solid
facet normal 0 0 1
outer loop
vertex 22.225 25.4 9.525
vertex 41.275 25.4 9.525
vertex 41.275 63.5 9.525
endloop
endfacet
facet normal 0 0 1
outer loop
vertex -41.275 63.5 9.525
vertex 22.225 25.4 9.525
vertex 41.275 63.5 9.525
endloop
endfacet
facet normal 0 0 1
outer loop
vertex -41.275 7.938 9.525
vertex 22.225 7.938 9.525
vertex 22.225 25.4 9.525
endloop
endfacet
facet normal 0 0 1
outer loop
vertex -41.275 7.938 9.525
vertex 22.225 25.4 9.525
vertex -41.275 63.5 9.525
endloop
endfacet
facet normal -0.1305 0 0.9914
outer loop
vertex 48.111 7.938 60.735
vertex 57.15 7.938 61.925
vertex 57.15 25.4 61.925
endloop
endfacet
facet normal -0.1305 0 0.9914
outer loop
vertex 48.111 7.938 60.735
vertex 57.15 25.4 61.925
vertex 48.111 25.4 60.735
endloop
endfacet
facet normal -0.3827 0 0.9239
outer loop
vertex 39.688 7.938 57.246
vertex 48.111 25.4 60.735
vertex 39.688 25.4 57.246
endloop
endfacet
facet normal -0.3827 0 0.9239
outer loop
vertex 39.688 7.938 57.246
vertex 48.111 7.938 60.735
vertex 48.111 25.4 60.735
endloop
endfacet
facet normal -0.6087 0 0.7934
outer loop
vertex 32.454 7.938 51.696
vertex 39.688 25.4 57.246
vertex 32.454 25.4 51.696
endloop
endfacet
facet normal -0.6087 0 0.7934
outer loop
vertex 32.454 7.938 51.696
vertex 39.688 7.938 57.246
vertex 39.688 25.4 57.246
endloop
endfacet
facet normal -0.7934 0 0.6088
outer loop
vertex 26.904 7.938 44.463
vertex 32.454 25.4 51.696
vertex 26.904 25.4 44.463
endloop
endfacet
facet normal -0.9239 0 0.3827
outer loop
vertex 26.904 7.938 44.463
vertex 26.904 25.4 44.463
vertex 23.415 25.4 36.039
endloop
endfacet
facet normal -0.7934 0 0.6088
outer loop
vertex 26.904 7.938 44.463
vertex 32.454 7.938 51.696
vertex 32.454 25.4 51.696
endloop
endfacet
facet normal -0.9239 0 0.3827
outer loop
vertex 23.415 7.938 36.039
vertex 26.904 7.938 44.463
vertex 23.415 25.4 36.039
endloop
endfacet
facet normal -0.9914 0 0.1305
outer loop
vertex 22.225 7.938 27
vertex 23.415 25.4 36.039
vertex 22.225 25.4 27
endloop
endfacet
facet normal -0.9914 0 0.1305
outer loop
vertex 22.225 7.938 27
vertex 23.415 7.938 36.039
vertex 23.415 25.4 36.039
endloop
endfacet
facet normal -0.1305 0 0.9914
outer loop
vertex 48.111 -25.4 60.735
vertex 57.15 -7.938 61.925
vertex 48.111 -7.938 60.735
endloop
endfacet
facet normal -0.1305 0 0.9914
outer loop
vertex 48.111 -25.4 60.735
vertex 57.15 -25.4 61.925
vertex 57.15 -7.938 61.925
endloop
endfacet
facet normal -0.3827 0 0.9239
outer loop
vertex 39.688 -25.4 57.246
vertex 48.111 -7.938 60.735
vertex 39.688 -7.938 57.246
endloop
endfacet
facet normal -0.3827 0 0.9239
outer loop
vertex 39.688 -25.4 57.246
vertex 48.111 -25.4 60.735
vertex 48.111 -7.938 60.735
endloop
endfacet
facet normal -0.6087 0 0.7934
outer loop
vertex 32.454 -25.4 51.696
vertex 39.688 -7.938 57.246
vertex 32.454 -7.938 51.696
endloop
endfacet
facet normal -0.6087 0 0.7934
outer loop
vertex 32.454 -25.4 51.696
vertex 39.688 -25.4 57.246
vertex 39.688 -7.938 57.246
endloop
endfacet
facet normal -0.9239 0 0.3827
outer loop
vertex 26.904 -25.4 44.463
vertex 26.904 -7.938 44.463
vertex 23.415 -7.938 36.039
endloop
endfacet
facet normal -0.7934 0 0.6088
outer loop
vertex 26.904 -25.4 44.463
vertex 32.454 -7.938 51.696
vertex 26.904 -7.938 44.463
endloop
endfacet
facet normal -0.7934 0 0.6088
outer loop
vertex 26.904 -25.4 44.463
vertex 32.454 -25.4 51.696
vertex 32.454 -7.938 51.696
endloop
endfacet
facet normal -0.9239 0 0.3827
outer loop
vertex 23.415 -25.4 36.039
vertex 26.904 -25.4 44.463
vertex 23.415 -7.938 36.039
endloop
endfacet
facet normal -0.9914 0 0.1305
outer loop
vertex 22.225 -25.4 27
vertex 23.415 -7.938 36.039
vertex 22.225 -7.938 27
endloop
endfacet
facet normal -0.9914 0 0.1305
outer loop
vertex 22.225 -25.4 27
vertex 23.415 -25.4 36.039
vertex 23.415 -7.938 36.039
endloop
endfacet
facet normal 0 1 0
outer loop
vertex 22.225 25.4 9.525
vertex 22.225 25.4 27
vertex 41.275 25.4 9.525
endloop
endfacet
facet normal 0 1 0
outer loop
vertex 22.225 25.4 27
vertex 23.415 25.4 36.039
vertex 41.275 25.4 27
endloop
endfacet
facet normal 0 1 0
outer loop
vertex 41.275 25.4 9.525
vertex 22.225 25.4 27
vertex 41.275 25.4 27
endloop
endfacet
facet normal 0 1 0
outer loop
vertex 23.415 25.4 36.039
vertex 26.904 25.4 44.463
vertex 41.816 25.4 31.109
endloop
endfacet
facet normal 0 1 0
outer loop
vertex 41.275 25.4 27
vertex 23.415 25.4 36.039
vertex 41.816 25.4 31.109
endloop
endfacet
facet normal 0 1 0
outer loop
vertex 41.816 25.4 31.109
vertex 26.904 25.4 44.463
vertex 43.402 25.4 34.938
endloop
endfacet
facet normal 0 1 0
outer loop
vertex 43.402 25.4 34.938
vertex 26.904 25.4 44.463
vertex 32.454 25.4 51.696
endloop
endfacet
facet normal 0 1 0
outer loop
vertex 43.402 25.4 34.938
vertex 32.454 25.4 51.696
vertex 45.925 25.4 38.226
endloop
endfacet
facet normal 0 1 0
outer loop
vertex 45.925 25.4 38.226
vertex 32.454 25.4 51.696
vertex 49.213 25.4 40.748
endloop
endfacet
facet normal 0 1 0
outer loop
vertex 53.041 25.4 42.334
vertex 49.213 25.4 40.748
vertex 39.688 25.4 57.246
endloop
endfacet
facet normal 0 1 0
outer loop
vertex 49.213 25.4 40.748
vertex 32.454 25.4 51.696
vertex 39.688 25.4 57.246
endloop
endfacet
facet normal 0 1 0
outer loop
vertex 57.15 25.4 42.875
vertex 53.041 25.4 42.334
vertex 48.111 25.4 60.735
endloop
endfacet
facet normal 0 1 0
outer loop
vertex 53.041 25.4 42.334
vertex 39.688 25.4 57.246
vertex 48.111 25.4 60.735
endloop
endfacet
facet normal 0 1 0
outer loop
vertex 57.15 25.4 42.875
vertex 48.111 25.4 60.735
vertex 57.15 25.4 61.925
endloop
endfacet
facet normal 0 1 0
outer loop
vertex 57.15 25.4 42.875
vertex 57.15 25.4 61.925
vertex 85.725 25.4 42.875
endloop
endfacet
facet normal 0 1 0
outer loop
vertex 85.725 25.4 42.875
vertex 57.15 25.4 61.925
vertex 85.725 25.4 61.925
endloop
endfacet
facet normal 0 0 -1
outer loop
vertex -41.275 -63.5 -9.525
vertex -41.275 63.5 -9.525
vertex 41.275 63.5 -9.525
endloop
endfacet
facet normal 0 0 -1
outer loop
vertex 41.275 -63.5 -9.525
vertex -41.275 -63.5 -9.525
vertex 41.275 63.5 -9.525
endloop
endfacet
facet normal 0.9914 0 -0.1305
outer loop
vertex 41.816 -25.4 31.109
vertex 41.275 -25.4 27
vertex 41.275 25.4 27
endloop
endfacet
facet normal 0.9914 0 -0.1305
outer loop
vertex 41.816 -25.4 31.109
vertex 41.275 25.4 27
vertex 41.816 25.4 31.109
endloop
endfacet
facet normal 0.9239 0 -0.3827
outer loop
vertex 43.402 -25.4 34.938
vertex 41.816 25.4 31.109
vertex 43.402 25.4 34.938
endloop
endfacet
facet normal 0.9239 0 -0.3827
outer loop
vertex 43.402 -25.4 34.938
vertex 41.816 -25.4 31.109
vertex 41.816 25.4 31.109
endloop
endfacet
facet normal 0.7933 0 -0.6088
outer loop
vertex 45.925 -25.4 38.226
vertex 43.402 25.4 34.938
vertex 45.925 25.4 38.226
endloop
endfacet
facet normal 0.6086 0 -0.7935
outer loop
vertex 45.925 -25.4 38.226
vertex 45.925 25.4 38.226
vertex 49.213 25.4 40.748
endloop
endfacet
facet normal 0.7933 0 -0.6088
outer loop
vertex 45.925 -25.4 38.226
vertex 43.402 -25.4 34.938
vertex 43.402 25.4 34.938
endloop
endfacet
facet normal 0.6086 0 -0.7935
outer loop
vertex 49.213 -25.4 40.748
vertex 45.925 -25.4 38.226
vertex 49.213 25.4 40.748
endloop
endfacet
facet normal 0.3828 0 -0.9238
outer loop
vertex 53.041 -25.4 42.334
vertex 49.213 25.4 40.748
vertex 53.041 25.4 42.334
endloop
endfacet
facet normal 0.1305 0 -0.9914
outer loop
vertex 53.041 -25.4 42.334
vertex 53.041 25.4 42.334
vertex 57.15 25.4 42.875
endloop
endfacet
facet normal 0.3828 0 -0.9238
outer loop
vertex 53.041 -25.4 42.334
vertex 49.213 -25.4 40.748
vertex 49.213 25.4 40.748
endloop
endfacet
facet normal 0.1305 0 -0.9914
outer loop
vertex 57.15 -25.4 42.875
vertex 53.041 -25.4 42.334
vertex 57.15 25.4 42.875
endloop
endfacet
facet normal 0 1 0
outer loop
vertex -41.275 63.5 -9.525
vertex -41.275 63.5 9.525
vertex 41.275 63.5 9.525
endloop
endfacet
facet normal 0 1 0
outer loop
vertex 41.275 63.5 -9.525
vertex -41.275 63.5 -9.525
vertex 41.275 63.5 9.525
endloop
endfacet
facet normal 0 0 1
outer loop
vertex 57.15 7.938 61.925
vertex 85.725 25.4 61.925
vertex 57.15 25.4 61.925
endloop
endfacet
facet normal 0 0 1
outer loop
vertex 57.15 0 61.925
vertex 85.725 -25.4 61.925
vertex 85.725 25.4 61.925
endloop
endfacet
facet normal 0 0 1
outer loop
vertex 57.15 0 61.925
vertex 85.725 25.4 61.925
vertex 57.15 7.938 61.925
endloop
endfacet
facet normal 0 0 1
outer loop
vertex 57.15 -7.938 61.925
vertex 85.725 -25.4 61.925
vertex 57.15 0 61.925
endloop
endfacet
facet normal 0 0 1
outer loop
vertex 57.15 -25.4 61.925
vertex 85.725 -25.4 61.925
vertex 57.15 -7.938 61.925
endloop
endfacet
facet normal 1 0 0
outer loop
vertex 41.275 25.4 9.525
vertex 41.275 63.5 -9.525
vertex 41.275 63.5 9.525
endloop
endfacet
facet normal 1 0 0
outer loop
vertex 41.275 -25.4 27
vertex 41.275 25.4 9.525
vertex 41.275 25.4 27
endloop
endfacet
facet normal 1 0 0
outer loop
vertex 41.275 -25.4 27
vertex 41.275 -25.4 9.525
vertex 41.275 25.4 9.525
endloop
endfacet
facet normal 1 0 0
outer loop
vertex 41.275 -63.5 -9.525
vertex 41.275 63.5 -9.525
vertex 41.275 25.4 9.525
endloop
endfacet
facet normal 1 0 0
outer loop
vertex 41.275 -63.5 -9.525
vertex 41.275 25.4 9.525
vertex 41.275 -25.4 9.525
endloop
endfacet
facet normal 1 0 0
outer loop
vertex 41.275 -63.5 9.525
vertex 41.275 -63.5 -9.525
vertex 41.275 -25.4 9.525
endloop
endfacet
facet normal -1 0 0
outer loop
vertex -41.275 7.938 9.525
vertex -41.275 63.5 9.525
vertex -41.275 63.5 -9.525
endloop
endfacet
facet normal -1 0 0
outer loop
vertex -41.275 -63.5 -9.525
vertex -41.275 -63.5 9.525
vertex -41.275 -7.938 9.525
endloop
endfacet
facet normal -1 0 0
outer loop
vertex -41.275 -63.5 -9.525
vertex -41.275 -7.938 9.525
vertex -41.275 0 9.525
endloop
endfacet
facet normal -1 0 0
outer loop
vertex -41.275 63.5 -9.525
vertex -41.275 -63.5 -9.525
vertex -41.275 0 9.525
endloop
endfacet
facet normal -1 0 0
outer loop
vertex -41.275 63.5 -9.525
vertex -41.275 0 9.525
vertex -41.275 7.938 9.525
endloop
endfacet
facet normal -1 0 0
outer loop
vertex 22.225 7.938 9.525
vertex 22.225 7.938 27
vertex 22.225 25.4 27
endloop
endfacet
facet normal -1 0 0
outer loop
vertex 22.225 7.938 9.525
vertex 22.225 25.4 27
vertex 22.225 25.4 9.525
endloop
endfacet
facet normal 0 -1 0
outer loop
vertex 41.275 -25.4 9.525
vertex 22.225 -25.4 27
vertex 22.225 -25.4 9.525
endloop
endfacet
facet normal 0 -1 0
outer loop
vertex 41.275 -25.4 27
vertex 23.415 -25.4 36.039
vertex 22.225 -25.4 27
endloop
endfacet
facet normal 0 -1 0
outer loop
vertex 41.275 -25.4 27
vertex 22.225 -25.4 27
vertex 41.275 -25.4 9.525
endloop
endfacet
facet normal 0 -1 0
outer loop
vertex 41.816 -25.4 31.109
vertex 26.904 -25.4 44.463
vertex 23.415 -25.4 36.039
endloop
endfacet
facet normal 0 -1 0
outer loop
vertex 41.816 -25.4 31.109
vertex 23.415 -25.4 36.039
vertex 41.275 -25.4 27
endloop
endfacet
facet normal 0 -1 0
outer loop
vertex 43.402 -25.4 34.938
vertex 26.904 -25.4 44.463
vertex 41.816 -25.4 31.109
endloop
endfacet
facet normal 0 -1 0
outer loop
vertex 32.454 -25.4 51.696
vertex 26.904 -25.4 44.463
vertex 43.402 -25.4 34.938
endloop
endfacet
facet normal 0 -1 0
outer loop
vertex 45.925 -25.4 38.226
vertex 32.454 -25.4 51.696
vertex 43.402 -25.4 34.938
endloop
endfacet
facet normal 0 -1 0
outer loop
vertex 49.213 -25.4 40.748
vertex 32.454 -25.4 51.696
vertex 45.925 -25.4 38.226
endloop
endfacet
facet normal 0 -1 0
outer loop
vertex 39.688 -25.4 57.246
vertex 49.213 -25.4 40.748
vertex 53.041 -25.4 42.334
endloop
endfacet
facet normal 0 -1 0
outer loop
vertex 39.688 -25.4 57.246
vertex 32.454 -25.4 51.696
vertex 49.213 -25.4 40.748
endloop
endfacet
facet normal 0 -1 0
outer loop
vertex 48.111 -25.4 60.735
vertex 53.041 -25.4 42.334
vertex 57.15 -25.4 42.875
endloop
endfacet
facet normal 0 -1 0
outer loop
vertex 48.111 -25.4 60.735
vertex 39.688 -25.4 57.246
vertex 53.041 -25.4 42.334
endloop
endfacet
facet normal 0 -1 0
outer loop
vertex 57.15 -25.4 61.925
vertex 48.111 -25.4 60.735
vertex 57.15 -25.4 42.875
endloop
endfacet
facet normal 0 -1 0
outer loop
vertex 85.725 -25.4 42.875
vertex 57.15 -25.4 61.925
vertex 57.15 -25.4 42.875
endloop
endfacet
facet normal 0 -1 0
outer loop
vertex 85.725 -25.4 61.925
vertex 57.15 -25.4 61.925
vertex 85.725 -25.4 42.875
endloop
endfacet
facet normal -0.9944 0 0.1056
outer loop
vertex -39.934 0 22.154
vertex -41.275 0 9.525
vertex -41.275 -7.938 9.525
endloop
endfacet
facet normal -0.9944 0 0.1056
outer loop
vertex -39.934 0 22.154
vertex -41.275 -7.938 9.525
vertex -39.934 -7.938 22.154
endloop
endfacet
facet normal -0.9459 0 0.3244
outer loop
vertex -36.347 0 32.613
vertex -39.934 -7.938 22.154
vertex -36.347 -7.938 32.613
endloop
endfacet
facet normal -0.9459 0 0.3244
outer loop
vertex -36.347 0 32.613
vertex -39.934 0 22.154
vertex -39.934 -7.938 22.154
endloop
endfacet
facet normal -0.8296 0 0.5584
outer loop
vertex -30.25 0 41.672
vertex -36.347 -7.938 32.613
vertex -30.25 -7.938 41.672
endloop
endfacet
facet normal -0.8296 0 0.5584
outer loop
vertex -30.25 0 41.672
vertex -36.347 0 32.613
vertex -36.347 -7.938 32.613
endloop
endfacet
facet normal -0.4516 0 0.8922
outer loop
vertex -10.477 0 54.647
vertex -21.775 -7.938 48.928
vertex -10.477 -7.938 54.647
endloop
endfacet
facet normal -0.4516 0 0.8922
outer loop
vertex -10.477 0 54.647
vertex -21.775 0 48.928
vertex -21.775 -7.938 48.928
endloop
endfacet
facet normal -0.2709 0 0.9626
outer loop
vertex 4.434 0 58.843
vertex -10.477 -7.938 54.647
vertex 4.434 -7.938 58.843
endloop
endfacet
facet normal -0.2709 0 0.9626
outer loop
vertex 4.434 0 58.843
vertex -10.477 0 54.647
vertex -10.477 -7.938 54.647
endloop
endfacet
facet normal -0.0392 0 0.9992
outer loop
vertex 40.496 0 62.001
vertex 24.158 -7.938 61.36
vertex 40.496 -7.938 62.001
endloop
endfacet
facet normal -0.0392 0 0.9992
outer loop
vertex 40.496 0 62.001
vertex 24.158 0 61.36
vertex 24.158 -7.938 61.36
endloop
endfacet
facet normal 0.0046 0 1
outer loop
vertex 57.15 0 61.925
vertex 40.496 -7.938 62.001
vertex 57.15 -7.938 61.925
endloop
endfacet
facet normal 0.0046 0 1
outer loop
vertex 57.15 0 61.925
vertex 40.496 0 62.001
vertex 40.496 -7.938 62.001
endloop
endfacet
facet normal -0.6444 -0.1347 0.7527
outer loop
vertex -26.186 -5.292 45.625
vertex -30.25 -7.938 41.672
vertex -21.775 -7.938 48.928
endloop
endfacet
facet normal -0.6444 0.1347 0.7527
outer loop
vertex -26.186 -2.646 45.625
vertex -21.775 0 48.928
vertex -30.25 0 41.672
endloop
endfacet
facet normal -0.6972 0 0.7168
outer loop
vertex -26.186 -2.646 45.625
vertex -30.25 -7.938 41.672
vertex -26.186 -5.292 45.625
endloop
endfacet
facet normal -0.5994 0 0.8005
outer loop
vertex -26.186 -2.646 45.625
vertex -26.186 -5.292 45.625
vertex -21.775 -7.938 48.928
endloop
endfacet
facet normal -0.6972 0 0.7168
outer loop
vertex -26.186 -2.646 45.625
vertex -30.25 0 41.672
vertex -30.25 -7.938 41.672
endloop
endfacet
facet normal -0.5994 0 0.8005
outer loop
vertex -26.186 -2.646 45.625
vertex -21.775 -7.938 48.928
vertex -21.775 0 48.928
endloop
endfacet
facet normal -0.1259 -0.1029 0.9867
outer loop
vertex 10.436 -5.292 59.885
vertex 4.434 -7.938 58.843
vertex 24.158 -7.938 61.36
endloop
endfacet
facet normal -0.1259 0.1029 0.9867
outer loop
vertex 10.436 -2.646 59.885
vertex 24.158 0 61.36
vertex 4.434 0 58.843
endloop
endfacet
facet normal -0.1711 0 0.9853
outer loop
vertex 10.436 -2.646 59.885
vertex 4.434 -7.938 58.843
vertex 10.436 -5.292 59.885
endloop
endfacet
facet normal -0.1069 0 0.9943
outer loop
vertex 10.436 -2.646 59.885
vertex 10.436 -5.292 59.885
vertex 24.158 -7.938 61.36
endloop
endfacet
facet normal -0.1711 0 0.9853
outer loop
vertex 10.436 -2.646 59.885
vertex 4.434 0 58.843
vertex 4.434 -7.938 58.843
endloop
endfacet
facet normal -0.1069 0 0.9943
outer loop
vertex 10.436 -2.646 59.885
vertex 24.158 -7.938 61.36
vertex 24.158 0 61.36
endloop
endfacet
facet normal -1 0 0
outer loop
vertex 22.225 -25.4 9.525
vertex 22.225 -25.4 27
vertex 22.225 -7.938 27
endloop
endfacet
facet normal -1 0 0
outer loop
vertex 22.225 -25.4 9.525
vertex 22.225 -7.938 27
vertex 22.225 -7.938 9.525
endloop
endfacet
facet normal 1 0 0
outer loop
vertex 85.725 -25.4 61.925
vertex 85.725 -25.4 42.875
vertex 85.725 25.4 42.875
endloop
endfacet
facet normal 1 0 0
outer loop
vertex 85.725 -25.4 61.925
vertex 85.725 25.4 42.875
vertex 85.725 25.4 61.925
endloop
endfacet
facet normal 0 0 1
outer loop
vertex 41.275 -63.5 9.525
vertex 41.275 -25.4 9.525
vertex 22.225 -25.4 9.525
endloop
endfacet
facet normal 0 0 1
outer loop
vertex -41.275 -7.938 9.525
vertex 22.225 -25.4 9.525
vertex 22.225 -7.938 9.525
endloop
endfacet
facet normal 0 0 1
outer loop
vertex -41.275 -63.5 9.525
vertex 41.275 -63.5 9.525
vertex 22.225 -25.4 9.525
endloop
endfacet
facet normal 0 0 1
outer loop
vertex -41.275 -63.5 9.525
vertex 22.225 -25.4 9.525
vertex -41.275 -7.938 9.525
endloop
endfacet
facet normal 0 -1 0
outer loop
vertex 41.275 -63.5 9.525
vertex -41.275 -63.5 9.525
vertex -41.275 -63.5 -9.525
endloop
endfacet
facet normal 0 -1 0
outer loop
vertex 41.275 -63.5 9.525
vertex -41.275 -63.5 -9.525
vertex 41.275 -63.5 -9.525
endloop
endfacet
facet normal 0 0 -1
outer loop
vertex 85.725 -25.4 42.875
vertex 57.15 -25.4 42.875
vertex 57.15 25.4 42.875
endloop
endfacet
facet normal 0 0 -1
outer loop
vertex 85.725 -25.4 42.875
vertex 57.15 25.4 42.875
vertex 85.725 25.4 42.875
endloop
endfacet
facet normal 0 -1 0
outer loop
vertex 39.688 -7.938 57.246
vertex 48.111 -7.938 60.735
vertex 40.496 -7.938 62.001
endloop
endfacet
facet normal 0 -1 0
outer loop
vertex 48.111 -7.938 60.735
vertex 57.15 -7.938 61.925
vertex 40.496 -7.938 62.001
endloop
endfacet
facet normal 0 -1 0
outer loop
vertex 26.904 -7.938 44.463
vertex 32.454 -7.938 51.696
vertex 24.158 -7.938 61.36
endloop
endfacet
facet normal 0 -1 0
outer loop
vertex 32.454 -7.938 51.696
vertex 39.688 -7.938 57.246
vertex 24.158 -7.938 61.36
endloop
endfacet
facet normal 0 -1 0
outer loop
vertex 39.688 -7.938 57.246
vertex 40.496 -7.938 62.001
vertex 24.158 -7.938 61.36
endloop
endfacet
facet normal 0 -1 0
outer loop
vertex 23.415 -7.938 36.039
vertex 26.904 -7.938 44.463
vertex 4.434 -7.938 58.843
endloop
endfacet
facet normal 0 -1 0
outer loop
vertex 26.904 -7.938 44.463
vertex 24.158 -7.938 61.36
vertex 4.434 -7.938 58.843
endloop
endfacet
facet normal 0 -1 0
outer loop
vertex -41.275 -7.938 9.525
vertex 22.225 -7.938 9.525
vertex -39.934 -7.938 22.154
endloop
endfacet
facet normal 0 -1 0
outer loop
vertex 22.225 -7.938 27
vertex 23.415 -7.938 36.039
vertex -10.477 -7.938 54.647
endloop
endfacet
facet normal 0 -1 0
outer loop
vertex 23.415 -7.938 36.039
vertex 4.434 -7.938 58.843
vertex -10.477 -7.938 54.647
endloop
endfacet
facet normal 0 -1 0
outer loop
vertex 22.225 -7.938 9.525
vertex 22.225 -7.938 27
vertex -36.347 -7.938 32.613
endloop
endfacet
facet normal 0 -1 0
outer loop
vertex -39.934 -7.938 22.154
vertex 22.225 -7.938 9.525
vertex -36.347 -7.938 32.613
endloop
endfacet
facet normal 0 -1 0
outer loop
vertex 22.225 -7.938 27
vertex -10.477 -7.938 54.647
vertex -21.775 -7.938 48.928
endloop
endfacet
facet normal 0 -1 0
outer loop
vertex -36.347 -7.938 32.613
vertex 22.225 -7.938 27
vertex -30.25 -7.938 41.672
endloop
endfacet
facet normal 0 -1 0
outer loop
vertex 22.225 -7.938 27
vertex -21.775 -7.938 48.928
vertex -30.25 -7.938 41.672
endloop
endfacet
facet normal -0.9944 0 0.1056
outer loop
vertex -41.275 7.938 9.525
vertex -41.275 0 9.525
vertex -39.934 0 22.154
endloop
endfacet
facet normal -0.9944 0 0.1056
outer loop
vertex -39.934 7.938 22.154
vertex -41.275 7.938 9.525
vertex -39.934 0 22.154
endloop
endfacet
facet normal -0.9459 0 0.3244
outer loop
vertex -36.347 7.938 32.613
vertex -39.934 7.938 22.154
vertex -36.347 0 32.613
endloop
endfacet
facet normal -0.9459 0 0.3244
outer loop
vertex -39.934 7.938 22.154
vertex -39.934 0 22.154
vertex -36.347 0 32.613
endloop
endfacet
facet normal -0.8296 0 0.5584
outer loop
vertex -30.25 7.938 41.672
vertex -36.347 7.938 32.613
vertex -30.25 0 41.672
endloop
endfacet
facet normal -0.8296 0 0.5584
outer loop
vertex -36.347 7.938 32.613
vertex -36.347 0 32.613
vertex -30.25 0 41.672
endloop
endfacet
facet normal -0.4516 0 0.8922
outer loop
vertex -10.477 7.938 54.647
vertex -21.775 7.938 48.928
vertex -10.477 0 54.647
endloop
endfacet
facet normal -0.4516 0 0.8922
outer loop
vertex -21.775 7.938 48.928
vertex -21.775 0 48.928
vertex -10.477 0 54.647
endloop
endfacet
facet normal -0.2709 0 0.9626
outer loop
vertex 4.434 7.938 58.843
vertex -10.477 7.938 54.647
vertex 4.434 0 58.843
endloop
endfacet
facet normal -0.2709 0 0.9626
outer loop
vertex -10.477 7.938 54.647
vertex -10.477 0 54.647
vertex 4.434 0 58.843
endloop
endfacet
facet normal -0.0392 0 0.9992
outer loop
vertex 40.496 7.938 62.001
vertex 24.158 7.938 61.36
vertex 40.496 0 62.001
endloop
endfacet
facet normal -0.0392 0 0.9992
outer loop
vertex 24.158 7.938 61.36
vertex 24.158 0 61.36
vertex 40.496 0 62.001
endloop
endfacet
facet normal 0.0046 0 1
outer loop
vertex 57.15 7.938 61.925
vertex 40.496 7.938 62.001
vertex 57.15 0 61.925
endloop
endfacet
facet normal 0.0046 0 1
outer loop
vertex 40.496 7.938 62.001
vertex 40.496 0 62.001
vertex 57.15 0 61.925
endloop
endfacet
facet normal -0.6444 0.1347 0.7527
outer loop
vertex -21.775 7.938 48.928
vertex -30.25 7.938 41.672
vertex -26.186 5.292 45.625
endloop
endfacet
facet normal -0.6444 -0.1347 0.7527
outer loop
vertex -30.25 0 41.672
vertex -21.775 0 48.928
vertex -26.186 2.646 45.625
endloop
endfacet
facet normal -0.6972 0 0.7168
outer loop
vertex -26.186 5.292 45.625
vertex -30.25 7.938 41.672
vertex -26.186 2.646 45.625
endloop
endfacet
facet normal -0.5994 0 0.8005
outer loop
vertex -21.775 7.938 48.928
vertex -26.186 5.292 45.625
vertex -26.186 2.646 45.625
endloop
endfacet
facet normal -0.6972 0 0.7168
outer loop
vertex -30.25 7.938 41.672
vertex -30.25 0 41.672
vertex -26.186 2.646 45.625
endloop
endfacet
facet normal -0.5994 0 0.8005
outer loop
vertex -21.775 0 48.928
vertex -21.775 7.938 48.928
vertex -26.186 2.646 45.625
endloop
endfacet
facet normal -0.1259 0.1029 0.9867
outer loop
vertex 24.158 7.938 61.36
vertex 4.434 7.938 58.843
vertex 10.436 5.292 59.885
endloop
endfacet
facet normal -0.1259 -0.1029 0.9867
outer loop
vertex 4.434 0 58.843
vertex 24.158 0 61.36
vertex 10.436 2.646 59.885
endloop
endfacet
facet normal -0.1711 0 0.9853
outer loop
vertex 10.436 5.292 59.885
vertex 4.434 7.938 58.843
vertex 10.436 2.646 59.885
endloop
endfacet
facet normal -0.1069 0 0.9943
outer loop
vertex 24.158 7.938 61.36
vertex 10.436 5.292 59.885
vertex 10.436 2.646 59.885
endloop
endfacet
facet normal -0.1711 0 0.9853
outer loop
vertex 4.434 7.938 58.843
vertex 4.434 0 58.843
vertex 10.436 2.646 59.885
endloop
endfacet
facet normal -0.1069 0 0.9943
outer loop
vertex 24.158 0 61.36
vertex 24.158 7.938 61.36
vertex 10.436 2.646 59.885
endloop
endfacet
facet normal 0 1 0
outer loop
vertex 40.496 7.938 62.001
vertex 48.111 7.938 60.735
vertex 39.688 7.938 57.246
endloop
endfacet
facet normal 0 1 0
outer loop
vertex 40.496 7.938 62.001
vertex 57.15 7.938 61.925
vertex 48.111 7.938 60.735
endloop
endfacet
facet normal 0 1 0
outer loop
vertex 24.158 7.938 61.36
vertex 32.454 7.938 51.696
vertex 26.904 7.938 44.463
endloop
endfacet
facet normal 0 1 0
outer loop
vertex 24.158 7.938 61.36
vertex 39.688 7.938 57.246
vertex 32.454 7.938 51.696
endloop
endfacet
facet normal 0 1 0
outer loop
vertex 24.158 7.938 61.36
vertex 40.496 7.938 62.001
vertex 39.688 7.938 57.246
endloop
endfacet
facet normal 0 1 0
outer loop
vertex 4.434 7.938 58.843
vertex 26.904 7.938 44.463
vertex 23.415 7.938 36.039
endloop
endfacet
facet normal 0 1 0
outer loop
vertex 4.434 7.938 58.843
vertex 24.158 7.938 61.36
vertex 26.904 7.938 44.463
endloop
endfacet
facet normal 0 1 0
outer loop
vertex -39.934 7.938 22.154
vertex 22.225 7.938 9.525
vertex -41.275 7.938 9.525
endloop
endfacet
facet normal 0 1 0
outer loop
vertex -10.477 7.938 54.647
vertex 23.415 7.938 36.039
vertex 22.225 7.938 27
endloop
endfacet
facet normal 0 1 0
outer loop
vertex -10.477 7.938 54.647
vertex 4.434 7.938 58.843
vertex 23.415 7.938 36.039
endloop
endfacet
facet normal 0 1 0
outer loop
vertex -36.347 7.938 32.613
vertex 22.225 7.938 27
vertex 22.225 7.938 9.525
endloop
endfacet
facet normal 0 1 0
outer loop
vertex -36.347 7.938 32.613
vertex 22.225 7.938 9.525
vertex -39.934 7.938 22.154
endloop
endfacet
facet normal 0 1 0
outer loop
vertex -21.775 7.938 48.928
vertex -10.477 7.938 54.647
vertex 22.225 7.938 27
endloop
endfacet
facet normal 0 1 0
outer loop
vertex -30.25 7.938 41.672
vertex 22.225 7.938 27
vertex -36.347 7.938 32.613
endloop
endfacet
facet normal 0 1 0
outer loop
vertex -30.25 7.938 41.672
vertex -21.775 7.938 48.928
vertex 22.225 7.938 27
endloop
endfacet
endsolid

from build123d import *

# Parameters (mm, degrees)
F1_DEPTH = 63.5
F0_W     = 25.4
F0_H     = 19.05
F2_DEPTH = 25.4
F3_DEPTH = 7.9375


with BuildPart() as f1:
    # F0 (on Front) → F1 (new body, symmetric)
    with BuildSketch(Plane.XZ):
        Polygon((22.225, 9.525), (-41.275, 9.525), (-41.275, -9.525), (41.275, -9.525), (41.275, 9.525), align=None)
    extrude(amount=F1_DEPTH, both=True)

    # F0 (on Front) → F2 (join, symmetric)
    with BuildSketch(Plane.XZ):
        with BuildLine():
            Line((22.225, 27.0002), (22.225, 9.525))
            Line((22.225, 9.525), (41.275, 9.525))
            Line((41.275, 9.525), (41.275, 27.0002))
            ThreePointArc((41.275, 27.0002), (45.9246798487, 38.2255201513), (57.15, 42.8752))
            Line((57.15, 42.8752), (60.325, 42.8752))
            Line((60.325, 42.8752), (60.325, 61.9252))
            Line((60.325, 61.9252), (57.15, 61.9252))
            ThreePointArc((57.15, 61.9252), (32.4542956671, 51.6959043329), (22.225, 27.0002))
        make_face()
        with Locations((73.025, 52.4002)):
            Rectangle(F0_W, F0_H)
    extrude(amount=F2_DEPTH, both=True)

    # F0 (on Front) → F3 (join, symmetric)
    with BuildSketch(Plane.XZ):
        with BuildLine():
            add(Edge.make_bspline(
                [(-41.275, 9.525), (-40.7656654716, 59.7505532205), (9.2027997598, 62.7891719341), (57.15, 61.9252)],
                knots=[0, 0, 0, 0, 111.5045361635, 111.5045361635, 111.5045361635, 111.5045361635], degree=3))
            Line((-41.275, 9.525), (22.225, 9.525))
            Line((22.225, 9.525), (22.225, 27.0002))
            ThreePointArc((22.225, 27.0002), (32.4542956671, 51.6959043329), (57.15, 61.9252))
        make_face()
    extrude(amount=F3_DEPTH, both=True)


solid = f1.part
